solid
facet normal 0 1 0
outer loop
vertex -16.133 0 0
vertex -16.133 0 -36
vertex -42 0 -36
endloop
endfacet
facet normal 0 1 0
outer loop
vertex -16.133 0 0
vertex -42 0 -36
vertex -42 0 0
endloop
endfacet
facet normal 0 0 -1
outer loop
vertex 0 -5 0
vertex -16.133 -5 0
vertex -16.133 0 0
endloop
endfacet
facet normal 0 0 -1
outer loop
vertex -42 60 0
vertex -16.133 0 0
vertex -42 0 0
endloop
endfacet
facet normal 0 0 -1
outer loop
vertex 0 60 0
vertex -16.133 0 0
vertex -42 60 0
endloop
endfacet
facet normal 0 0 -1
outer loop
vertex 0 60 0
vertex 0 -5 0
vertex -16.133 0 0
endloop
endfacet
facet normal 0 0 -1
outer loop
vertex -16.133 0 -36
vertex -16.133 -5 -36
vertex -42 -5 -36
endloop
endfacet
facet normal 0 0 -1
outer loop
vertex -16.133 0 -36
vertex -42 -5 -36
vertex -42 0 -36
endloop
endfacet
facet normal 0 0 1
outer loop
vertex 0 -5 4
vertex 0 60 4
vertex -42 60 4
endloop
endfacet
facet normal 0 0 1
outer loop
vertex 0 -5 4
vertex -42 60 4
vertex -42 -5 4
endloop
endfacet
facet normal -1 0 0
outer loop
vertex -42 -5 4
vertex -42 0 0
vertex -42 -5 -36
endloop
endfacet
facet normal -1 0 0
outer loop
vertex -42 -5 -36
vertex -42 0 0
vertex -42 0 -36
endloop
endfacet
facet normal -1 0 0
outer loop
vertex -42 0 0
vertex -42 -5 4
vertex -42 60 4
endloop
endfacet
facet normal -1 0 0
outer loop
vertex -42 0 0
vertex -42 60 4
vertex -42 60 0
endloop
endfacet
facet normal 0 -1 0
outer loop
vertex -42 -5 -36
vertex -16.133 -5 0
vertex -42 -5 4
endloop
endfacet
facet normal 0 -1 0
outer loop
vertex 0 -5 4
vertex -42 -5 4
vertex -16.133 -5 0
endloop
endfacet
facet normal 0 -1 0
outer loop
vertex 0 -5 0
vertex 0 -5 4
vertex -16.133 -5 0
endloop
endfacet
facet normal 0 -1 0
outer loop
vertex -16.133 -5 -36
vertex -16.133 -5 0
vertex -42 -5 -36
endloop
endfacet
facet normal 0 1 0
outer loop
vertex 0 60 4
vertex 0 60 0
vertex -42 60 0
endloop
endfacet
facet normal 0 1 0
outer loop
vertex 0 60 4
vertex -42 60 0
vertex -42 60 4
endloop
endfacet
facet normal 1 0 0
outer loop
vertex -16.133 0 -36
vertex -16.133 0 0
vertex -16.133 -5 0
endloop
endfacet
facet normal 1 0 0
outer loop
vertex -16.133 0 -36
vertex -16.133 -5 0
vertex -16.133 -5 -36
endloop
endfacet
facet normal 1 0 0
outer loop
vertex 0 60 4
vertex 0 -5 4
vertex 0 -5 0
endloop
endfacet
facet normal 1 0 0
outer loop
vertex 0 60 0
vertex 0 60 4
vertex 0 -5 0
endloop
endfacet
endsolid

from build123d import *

# Parameters (mm, degrees)
EXTRUDE_1_DEPTH     = 42
SKETCH_3_W          = 16.132543854
SKETCH_3_H          = 36.374490106
CUT_EXTRUDE_1_DEPTH = 82.608823052


with BuildPart() as part:
    # Эскиз1 → Вытянуть1 (new body)
    with BuildSketch(Plane(origin=(0, 0, 0), x_dir=(0, 0, -1), z_dir=(1, 0, 0))):
        Polygon((0, 0), (0, 60), (-4, 60), (-4, -5), (36, -5), (36, 0), align=None)
    extrude(amount=-EXTRUDE_1_DEPTH)

    # Эскиз3 → Вырез-Вытянуть1 (cut, through all)
    with BuildSketch(Plane(origin=(0, 0, 0), x_dir=(1, 0, 0), z_dir=(0, 1, 0))):
        with Locations((-8.066271927, 18.187245053)):
            Rectangle(SKETCH_3_W, SKETCH_3_H)
    extrude(amount=-CUT_EXTRUDE_1_DEPTH, mode=Mode.SUBTRACT)


solid = part.part
